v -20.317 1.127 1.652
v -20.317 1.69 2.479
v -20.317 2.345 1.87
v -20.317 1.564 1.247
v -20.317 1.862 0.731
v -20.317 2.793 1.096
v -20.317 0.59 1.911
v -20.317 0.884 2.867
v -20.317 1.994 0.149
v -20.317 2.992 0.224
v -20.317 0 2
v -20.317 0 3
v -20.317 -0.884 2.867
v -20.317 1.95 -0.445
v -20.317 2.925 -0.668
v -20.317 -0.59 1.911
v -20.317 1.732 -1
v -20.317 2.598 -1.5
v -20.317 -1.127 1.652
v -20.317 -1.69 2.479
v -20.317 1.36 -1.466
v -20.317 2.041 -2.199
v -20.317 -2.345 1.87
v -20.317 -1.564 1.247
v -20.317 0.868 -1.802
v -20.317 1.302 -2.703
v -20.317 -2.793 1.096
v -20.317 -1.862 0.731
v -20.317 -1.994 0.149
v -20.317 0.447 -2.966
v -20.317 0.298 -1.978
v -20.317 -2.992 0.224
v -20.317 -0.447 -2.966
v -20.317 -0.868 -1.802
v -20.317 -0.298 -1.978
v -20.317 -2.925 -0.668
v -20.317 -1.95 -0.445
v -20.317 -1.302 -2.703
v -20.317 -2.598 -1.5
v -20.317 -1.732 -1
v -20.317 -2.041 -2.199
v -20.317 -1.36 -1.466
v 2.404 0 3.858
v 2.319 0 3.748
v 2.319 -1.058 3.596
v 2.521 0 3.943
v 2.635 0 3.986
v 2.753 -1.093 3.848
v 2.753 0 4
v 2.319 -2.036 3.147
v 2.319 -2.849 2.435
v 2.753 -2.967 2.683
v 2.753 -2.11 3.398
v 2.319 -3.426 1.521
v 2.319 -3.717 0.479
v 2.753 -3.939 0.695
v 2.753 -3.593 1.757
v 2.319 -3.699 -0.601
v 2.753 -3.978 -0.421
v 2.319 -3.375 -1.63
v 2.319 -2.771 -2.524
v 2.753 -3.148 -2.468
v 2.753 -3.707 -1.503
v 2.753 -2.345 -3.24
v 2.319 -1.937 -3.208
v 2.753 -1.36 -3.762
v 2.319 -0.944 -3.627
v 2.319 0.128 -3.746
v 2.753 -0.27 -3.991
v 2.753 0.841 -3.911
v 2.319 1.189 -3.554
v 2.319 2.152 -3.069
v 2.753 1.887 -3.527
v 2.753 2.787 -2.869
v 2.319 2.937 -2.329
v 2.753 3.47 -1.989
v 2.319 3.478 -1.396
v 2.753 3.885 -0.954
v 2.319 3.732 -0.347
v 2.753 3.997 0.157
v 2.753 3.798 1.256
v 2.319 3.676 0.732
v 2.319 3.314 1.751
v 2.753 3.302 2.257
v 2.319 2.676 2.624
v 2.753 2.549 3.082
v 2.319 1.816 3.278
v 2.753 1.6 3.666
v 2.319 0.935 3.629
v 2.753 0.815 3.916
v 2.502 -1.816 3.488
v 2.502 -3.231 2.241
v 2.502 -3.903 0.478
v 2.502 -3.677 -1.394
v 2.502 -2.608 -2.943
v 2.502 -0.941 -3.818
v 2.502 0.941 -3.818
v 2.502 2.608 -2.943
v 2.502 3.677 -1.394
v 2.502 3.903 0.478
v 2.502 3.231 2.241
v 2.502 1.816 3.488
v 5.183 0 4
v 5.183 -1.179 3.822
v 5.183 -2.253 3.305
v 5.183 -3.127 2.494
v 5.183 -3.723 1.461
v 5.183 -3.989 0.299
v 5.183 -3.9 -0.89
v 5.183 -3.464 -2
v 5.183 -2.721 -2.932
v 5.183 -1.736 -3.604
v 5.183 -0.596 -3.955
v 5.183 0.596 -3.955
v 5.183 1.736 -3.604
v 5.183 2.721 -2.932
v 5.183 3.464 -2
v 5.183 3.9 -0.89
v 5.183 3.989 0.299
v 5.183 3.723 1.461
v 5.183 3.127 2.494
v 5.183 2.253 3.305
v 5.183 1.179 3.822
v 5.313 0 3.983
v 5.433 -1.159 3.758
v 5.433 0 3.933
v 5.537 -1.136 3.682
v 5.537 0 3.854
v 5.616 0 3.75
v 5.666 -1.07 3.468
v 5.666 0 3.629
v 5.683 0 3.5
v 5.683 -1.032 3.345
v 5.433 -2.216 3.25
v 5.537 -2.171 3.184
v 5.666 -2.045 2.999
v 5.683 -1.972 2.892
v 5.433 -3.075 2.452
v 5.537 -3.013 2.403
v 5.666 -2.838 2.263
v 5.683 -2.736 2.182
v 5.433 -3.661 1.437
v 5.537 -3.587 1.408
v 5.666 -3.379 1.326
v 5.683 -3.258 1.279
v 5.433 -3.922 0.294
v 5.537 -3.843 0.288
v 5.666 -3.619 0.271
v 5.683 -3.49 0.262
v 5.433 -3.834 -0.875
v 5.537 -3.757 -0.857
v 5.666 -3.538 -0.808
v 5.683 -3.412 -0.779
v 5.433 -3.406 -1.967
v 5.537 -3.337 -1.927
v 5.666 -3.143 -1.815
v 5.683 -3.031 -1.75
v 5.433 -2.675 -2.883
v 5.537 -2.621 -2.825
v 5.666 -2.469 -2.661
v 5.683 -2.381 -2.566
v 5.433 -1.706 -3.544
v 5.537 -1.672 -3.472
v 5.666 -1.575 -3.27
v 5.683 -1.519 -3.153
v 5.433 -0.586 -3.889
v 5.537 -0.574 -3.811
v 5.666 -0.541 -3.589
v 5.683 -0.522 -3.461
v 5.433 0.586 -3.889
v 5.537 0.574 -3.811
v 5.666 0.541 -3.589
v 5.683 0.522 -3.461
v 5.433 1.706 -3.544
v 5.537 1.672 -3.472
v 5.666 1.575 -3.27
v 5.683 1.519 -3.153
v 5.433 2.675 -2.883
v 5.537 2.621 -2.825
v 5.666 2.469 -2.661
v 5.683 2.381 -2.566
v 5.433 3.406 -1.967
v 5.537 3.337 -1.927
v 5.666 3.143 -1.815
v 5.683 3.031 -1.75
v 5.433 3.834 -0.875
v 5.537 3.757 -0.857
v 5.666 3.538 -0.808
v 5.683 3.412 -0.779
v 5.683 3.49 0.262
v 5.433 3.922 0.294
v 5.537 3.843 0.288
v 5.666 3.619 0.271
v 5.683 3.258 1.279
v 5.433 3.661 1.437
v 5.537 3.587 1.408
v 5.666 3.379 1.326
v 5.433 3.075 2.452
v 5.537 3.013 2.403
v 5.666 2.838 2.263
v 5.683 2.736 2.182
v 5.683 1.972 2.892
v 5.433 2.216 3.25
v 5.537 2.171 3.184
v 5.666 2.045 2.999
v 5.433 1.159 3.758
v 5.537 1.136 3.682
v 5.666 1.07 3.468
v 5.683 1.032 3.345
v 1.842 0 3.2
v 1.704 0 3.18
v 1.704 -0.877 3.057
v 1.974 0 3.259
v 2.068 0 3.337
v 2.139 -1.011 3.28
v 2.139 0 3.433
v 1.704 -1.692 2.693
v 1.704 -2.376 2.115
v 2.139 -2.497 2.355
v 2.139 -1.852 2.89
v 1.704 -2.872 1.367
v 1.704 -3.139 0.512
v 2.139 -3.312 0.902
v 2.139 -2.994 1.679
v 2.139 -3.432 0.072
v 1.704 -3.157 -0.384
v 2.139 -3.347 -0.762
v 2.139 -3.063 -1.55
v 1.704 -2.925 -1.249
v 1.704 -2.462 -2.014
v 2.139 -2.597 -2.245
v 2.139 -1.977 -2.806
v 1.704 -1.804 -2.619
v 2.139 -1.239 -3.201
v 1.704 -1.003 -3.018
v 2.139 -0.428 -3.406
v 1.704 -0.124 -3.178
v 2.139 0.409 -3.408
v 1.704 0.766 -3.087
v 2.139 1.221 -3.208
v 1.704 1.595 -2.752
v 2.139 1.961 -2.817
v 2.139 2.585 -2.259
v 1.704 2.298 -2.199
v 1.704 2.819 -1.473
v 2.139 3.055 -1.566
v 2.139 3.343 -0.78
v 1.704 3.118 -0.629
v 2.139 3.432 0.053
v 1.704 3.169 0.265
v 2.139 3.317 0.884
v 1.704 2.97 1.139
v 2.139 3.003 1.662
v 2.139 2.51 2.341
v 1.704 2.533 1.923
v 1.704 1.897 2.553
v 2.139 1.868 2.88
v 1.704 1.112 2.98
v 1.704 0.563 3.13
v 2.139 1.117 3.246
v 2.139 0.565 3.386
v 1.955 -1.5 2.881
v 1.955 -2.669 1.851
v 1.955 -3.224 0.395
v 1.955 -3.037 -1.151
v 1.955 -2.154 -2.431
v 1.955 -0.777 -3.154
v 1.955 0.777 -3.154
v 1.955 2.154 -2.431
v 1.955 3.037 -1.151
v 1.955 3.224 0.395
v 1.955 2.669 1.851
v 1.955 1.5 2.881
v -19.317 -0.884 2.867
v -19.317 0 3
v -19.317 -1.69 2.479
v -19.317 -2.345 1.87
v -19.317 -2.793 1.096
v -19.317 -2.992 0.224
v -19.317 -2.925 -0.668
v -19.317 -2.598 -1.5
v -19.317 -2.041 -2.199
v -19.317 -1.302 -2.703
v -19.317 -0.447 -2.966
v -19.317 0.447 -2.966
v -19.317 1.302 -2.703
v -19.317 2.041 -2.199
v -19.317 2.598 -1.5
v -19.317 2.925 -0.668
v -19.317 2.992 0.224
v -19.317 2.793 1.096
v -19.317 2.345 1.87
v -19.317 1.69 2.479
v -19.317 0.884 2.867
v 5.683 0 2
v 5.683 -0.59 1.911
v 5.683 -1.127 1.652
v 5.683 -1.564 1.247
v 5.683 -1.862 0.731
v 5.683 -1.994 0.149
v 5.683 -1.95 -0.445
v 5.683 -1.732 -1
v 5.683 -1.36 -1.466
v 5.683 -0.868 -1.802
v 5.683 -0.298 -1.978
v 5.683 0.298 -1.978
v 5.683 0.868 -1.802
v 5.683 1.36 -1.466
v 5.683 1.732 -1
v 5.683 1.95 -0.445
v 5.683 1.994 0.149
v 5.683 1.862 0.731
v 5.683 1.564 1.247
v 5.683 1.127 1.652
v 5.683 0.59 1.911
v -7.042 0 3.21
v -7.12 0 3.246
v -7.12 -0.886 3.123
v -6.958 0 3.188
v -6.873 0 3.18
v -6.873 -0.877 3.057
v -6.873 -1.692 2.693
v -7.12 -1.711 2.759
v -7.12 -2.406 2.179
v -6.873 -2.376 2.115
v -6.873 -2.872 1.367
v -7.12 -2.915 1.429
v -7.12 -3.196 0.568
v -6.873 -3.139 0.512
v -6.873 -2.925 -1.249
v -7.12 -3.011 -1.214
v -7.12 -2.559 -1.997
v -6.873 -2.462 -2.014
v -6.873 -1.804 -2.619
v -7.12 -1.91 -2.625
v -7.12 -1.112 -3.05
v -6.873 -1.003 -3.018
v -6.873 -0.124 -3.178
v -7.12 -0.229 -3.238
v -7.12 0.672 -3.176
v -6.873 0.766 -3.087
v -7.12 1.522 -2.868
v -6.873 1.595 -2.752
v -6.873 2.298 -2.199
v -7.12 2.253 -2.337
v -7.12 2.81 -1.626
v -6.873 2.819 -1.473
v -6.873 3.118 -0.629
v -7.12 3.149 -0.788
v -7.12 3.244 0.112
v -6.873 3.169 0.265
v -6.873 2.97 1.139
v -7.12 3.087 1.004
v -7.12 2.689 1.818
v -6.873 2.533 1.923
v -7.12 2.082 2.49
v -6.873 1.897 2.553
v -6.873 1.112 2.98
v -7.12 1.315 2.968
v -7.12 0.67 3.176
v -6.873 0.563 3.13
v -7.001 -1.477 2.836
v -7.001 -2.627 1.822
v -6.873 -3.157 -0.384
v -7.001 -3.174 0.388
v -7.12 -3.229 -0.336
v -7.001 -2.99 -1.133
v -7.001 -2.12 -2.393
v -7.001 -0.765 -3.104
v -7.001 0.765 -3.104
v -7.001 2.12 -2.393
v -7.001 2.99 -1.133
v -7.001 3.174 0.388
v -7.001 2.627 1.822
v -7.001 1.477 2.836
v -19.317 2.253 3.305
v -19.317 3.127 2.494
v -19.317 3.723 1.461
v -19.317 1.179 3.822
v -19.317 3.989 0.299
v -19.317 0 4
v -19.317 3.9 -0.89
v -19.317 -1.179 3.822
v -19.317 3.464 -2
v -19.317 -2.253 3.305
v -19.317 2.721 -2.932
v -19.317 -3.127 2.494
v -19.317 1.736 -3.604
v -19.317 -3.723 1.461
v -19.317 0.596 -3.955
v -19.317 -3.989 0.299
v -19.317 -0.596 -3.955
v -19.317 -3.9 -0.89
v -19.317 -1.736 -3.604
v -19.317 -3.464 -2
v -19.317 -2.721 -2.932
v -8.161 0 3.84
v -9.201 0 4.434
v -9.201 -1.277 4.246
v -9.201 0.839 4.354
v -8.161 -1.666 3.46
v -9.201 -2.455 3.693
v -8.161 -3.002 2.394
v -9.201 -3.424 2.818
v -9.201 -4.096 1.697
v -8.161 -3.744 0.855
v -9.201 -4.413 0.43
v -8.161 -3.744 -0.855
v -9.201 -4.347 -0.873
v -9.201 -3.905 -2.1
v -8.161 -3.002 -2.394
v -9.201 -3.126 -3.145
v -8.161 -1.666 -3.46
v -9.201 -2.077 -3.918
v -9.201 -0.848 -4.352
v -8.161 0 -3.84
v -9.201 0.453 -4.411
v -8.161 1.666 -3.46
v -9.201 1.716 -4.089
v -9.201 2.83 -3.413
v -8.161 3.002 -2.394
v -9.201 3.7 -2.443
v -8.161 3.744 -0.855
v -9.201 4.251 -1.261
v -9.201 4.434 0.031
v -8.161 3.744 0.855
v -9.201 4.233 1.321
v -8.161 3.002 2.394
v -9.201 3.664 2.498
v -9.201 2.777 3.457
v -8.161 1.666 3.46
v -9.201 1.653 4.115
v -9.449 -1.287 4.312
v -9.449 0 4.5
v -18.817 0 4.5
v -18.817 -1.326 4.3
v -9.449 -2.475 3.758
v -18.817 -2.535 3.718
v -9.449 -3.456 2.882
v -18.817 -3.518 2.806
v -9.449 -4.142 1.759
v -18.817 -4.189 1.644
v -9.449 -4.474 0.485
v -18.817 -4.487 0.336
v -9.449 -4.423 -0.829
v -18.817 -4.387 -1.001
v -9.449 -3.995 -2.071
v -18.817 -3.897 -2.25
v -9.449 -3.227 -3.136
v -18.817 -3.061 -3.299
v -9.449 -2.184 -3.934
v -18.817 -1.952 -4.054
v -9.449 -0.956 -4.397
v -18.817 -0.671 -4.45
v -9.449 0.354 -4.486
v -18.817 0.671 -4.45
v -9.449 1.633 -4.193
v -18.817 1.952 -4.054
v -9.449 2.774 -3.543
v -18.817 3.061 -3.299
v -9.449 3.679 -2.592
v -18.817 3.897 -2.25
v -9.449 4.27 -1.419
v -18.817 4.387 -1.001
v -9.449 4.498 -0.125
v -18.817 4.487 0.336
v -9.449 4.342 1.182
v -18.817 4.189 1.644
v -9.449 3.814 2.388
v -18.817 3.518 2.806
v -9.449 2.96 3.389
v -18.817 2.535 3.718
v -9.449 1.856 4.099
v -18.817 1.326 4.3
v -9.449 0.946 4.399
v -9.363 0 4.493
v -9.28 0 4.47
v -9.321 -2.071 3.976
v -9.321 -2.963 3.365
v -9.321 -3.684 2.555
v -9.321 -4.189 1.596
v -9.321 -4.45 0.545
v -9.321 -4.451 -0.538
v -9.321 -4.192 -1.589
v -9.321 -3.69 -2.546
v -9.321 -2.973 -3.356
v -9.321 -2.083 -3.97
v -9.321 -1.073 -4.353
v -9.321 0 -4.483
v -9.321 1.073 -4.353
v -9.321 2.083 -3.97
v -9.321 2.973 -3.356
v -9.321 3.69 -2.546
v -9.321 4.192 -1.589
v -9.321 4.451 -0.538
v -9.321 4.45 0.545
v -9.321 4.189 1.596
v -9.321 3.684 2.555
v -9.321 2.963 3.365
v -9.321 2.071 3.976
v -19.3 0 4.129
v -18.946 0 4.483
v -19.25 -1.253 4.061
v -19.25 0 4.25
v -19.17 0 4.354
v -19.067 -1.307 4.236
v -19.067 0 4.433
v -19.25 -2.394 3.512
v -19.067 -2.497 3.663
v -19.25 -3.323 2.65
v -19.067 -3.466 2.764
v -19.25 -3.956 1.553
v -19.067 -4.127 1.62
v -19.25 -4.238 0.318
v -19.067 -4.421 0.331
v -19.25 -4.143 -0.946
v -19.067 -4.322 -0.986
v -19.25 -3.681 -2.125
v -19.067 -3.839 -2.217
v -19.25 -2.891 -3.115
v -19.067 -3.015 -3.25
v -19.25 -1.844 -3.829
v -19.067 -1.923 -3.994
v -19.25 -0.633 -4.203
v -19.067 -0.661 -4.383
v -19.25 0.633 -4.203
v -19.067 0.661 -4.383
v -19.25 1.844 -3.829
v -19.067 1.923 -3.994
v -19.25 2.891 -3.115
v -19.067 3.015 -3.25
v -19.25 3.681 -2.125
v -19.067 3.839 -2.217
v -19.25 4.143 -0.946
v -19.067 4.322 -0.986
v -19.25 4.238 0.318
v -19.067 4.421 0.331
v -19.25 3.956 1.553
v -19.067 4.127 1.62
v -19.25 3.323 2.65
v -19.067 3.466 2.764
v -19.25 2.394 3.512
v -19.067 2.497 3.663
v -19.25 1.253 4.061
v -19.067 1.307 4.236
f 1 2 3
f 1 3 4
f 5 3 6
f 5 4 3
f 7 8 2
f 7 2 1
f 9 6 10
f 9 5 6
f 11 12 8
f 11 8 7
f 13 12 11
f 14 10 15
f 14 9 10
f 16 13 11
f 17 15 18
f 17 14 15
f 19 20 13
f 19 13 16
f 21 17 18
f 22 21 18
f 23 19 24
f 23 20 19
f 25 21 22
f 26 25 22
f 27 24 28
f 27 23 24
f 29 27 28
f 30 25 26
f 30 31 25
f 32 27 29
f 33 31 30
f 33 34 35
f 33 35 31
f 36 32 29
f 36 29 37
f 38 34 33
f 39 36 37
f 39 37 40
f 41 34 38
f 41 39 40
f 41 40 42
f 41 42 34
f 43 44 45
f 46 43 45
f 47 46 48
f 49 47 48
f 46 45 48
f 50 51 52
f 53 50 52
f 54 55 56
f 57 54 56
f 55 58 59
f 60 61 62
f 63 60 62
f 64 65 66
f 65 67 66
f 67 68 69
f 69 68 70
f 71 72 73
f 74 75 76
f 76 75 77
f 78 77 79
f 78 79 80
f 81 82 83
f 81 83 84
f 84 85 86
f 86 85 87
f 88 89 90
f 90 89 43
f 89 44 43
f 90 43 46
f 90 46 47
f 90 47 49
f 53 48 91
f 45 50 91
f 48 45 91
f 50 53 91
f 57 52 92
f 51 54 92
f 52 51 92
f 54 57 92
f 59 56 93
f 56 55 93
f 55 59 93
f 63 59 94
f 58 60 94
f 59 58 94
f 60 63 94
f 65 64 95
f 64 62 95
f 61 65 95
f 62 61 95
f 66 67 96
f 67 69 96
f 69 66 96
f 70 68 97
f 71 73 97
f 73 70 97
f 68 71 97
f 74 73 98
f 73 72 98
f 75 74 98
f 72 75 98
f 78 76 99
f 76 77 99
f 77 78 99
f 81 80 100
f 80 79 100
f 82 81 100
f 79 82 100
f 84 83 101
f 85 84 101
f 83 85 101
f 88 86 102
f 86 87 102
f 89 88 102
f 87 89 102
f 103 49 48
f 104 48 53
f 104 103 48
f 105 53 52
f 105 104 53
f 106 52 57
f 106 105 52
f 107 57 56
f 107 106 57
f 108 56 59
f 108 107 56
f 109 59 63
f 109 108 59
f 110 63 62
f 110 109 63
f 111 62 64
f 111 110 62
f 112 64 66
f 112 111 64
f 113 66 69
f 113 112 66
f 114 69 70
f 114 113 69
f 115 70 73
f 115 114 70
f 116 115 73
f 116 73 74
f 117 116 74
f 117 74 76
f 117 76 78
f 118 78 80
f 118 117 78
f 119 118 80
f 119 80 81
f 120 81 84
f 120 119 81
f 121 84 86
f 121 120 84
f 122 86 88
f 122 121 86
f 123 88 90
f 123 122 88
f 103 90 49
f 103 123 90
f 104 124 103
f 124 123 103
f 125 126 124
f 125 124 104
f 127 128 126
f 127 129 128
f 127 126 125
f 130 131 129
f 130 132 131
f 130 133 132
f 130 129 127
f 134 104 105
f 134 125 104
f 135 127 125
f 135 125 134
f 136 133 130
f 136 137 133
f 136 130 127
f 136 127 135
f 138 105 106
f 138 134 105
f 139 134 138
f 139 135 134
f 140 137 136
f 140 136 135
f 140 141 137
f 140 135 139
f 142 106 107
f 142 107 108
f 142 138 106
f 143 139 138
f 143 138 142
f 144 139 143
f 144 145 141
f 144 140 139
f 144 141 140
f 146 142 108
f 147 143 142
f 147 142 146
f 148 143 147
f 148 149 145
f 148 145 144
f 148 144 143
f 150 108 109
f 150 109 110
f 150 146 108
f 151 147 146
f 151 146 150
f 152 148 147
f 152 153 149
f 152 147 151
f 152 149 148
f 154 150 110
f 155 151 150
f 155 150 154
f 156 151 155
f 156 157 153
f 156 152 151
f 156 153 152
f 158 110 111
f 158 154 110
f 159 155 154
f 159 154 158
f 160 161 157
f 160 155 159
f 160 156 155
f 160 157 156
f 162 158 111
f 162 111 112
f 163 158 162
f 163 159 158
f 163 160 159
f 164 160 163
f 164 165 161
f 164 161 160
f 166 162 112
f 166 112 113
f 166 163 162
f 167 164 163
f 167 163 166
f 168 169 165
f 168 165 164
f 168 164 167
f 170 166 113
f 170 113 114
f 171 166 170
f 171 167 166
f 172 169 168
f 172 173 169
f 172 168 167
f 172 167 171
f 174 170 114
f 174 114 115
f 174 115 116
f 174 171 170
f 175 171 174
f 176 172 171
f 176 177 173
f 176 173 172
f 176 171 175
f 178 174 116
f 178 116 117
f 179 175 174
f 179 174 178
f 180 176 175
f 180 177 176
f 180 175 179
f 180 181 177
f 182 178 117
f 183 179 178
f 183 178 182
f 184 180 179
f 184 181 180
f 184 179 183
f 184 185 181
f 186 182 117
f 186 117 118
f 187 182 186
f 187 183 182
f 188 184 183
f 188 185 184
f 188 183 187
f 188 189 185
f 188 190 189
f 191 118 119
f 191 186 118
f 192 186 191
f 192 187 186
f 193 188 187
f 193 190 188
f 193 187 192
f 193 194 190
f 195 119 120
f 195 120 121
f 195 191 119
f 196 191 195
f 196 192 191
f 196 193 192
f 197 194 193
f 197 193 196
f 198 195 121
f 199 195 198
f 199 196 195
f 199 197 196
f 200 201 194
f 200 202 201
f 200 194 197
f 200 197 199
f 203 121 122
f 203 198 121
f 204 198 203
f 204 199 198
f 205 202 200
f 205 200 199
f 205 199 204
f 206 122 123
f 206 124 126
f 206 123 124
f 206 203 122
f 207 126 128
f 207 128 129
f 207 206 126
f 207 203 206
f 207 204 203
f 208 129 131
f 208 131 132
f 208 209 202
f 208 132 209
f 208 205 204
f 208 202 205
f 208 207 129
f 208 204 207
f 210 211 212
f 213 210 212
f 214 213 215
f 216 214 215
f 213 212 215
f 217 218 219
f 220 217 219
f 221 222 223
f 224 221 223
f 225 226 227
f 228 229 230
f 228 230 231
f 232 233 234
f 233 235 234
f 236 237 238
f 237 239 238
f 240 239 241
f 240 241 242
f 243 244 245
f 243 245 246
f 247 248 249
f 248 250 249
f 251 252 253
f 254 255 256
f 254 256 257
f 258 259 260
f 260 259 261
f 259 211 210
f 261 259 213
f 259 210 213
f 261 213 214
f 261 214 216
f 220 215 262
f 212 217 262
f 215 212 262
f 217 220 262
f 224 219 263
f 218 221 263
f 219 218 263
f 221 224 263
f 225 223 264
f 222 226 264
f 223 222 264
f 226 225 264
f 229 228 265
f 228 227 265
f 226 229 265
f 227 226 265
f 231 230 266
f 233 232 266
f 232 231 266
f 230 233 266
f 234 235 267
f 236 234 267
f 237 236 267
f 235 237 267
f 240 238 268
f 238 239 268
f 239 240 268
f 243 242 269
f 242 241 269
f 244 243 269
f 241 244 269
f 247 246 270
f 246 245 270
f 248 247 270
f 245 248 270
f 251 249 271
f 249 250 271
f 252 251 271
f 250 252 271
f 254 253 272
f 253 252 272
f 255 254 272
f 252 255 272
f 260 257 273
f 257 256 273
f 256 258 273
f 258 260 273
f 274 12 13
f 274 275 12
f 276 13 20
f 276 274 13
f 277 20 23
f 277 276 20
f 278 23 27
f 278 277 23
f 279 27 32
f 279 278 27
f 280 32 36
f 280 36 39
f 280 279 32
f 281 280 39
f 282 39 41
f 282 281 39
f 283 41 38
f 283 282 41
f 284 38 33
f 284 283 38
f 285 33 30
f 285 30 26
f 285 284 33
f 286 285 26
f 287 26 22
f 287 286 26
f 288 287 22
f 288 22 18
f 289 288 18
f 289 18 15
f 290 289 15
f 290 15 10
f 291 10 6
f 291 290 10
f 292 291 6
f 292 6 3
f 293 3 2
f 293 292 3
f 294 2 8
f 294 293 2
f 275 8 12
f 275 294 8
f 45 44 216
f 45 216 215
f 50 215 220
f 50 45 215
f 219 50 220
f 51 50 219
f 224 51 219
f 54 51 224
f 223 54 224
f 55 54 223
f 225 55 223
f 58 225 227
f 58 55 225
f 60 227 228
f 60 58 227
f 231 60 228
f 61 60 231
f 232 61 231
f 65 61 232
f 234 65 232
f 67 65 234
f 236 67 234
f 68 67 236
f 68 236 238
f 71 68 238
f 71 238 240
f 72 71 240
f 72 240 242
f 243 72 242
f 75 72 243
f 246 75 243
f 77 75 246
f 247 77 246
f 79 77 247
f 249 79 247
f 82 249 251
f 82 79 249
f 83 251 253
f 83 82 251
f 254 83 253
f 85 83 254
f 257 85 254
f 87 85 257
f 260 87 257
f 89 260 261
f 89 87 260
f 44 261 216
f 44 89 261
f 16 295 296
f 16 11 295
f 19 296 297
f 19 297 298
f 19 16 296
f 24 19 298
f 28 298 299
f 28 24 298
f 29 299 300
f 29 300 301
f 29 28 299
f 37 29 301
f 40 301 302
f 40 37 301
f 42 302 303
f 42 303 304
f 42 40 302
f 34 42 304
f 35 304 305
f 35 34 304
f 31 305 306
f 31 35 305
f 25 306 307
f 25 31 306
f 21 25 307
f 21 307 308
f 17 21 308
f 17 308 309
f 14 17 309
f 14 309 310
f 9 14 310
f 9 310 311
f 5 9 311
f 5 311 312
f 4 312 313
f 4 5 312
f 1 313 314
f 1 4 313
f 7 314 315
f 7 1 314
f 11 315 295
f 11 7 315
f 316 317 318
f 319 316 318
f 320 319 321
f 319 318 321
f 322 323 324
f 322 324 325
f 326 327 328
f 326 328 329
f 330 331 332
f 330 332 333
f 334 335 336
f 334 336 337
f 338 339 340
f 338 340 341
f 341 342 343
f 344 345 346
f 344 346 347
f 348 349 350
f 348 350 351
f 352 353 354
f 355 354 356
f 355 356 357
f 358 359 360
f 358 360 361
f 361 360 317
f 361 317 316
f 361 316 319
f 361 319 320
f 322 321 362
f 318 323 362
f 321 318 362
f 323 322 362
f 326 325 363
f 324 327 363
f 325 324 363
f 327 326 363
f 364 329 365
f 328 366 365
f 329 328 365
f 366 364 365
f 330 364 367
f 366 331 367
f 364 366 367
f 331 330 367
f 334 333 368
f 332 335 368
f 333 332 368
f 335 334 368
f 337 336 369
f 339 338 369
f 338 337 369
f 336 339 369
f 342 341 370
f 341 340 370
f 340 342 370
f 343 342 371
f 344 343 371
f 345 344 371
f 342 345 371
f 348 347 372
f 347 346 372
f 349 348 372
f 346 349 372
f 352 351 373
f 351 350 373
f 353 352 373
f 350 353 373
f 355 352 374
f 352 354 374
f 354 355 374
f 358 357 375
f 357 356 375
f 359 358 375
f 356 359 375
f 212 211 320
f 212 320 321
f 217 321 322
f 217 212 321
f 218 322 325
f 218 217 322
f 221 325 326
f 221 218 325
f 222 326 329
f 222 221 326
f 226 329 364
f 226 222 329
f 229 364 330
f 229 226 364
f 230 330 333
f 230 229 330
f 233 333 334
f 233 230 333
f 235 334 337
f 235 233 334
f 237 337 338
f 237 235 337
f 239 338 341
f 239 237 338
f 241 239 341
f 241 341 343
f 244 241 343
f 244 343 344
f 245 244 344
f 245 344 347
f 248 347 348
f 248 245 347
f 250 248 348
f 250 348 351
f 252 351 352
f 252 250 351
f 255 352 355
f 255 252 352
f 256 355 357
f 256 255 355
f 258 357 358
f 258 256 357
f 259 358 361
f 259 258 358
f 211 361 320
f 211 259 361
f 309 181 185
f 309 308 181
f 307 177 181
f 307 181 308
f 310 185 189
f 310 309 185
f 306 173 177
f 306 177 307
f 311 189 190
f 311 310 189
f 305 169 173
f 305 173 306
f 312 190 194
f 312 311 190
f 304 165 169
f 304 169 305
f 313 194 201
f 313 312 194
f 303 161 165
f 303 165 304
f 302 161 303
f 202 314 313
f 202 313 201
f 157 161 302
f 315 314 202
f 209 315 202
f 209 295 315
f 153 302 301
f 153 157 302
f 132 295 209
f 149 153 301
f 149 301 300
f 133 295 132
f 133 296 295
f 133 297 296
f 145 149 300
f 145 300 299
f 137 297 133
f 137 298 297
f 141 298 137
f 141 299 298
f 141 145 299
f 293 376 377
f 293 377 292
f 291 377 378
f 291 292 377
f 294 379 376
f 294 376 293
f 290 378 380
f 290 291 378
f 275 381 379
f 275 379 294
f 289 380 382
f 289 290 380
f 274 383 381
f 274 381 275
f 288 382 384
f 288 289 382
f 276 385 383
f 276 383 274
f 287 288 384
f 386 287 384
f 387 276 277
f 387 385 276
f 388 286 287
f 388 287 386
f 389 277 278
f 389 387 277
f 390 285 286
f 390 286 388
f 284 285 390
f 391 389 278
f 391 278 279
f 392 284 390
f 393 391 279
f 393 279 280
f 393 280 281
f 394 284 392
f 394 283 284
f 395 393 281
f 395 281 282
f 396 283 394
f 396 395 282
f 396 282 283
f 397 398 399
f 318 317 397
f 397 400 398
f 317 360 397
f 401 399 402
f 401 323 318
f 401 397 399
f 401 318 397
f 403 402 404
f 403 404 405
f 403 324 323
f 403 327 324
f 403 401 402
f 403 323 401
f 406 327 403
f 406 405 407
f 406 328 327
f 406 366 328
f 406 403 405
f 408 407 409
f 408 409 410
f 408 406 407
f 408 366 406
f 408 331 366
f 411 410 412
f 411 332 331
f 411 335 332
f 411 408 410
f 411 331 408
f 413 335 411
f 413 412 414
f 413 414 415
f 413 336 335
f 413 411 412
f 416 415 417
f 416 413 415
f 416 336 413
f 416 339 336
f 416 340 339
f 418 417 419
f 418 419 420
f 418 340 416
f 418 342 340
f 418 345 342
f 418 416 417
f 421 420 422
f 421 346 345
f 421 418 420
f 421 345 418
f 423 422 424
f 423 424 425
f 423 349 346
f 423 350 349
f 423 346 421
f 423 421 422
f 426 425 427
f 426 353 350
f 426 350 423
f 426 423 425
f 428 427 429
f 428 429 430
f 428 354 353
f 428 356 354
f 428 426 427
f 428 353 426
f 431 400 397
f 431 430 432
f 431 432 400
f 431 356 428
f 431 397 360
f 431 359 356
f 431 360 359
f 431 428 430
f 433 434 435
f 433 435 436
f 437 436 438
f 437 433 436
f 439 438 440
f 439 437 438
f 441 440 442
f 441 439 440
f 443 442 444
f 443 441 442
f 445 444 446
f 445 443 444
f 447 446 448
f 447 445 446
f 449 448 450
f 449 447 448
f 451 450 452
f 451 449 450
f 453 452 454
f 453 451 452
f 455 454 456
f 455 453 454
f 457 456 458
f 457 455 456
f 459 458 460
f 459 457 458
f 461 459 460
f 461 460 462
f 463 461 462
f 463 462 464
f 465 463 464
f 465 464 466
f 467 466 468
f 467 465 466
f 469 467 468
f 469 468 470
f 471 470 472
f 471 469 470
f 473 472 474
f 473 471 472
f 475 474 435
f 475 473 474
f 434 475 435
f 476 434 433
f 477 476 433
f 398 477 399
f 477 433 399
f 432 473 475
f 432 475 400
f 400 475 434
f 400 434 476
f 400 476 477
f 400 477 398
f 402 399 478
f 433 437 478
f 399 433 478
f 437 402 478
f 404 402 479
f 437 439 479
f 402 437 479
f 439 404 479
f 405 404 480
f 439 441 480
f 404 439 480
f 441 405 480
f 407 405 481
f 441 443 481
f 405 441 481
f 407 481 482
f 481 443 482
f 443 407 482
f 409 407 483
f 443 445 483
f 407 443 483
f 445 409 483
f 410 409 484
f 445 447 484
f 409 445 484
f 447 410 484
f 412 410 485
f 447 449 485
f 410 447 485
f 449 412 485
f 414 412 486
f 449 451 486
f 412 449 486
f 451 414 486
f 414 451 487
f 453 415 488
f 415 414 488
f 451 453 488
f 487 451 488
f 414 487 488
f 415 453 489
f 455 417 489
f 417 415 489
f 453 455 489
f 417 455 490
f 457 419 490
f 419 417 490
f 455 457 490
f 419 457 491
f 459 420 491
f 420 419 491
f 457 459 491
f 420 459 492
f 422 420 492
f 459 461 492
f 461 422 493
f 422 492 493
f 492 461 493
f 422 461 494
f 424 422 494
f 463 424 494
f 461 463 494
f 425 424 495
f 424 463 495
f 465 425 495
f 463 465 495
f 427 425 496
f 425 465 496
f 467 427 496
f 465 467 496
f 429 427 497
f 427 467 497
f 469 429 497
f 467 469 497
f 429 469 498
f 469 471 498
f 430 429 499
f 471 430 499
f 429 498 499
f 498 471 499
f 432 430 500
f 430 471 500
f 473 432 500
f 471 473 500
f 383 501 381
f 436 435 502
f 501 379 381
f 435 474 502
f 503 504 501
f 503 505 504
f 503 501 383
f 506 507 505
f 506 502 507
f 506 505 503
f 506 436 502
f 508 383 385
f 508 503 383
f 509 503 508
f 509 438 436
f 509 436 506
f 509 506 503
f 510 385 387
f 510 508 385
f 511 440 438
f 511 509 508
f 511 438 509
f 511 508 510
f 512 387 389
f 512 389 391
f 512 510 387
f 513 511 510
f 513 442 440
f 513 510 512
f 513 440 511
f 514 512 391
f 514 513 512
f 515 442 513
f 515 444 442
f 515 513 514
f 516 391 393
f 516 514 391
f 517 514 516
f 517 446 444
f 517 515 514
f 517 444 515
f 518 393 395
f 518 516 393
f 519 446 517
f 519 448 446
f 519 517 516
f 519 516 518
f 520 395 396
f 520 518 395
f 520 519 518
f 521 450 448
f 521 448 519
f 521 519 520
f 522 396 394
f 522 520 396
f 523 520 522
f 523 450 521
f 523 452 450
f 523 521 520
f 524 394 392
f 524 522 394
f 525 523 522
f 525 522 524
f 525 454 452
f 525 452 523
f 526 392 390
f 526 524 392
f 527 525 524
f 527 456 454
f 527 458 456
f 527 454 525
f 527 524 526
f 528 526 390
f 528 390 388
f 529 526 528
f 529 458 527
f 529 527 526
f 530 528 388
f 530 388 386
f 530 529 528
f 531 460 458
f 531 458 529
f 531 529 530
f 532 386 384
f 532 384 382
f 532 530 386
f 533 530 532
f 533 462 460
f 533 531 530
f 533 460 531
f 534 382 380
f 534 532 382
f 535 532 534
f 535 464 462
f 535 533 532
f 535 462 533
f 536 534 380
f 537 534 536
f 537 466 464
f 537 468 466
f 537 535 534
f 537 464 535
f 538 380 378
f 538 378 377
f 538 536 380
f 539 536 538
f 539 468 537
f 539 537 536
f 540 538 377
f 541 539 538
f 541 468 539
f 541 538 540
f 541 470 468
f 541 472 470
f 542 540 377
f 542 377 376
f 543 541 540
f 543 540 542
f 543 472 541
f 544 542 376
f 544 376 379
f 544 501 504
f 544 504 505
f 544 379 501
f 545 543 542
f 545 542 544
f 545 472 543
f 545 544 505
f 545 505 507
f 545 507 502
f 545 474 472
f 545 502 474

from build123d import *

# Parameters (mm, degrees)
FILLET_1_R = 0.5


with BuildPart() as part:
    # Эскиз1 → Повернуть1 (revolve)
    with BuildSketch(Plane(origin=(0, 0, 0), x_dir=(1, 0, 0), z_dir=(0, 1, 0)), mode=Mode.PRIVATE) as revolve_1_sk:
        Polygon((-20.31661762, 2), (-20.31661762, 3), (-19.31661762, 3), (-19.31661762, 4.5), (-9.31661762, 4.5), (-7.005272431, 3.180480624), (1.994727569, 3.180480624), (2.462581397, 4), (5.68338238, 4), (5.68338238, 2), align=None)
    revolve(revolve_1_sk.sketch.rotate(Axis((-48.681122779, 0, 0), (1, 0, 0)), 180), axis=Axis((-48.681122779, 0, 0), (1, 0, 0)))

    # Скругление1
    fillet_1_edges = [part.edges().sort_by_distance(p)[0] for p in [
        (-19.31661762, 0, -4.5),
        (-9.31661762, 0, -4.5),
        (-7.005272431, 0, -3.180480624),
        (1.994727569, 0, -3.180480624),
        (2.462581397, 0, -4),
        (5.68338238, 0, -4),
    ]]
    fillet(fillet_1_edges, radius=FILLET_1_R)


solid = part.part
